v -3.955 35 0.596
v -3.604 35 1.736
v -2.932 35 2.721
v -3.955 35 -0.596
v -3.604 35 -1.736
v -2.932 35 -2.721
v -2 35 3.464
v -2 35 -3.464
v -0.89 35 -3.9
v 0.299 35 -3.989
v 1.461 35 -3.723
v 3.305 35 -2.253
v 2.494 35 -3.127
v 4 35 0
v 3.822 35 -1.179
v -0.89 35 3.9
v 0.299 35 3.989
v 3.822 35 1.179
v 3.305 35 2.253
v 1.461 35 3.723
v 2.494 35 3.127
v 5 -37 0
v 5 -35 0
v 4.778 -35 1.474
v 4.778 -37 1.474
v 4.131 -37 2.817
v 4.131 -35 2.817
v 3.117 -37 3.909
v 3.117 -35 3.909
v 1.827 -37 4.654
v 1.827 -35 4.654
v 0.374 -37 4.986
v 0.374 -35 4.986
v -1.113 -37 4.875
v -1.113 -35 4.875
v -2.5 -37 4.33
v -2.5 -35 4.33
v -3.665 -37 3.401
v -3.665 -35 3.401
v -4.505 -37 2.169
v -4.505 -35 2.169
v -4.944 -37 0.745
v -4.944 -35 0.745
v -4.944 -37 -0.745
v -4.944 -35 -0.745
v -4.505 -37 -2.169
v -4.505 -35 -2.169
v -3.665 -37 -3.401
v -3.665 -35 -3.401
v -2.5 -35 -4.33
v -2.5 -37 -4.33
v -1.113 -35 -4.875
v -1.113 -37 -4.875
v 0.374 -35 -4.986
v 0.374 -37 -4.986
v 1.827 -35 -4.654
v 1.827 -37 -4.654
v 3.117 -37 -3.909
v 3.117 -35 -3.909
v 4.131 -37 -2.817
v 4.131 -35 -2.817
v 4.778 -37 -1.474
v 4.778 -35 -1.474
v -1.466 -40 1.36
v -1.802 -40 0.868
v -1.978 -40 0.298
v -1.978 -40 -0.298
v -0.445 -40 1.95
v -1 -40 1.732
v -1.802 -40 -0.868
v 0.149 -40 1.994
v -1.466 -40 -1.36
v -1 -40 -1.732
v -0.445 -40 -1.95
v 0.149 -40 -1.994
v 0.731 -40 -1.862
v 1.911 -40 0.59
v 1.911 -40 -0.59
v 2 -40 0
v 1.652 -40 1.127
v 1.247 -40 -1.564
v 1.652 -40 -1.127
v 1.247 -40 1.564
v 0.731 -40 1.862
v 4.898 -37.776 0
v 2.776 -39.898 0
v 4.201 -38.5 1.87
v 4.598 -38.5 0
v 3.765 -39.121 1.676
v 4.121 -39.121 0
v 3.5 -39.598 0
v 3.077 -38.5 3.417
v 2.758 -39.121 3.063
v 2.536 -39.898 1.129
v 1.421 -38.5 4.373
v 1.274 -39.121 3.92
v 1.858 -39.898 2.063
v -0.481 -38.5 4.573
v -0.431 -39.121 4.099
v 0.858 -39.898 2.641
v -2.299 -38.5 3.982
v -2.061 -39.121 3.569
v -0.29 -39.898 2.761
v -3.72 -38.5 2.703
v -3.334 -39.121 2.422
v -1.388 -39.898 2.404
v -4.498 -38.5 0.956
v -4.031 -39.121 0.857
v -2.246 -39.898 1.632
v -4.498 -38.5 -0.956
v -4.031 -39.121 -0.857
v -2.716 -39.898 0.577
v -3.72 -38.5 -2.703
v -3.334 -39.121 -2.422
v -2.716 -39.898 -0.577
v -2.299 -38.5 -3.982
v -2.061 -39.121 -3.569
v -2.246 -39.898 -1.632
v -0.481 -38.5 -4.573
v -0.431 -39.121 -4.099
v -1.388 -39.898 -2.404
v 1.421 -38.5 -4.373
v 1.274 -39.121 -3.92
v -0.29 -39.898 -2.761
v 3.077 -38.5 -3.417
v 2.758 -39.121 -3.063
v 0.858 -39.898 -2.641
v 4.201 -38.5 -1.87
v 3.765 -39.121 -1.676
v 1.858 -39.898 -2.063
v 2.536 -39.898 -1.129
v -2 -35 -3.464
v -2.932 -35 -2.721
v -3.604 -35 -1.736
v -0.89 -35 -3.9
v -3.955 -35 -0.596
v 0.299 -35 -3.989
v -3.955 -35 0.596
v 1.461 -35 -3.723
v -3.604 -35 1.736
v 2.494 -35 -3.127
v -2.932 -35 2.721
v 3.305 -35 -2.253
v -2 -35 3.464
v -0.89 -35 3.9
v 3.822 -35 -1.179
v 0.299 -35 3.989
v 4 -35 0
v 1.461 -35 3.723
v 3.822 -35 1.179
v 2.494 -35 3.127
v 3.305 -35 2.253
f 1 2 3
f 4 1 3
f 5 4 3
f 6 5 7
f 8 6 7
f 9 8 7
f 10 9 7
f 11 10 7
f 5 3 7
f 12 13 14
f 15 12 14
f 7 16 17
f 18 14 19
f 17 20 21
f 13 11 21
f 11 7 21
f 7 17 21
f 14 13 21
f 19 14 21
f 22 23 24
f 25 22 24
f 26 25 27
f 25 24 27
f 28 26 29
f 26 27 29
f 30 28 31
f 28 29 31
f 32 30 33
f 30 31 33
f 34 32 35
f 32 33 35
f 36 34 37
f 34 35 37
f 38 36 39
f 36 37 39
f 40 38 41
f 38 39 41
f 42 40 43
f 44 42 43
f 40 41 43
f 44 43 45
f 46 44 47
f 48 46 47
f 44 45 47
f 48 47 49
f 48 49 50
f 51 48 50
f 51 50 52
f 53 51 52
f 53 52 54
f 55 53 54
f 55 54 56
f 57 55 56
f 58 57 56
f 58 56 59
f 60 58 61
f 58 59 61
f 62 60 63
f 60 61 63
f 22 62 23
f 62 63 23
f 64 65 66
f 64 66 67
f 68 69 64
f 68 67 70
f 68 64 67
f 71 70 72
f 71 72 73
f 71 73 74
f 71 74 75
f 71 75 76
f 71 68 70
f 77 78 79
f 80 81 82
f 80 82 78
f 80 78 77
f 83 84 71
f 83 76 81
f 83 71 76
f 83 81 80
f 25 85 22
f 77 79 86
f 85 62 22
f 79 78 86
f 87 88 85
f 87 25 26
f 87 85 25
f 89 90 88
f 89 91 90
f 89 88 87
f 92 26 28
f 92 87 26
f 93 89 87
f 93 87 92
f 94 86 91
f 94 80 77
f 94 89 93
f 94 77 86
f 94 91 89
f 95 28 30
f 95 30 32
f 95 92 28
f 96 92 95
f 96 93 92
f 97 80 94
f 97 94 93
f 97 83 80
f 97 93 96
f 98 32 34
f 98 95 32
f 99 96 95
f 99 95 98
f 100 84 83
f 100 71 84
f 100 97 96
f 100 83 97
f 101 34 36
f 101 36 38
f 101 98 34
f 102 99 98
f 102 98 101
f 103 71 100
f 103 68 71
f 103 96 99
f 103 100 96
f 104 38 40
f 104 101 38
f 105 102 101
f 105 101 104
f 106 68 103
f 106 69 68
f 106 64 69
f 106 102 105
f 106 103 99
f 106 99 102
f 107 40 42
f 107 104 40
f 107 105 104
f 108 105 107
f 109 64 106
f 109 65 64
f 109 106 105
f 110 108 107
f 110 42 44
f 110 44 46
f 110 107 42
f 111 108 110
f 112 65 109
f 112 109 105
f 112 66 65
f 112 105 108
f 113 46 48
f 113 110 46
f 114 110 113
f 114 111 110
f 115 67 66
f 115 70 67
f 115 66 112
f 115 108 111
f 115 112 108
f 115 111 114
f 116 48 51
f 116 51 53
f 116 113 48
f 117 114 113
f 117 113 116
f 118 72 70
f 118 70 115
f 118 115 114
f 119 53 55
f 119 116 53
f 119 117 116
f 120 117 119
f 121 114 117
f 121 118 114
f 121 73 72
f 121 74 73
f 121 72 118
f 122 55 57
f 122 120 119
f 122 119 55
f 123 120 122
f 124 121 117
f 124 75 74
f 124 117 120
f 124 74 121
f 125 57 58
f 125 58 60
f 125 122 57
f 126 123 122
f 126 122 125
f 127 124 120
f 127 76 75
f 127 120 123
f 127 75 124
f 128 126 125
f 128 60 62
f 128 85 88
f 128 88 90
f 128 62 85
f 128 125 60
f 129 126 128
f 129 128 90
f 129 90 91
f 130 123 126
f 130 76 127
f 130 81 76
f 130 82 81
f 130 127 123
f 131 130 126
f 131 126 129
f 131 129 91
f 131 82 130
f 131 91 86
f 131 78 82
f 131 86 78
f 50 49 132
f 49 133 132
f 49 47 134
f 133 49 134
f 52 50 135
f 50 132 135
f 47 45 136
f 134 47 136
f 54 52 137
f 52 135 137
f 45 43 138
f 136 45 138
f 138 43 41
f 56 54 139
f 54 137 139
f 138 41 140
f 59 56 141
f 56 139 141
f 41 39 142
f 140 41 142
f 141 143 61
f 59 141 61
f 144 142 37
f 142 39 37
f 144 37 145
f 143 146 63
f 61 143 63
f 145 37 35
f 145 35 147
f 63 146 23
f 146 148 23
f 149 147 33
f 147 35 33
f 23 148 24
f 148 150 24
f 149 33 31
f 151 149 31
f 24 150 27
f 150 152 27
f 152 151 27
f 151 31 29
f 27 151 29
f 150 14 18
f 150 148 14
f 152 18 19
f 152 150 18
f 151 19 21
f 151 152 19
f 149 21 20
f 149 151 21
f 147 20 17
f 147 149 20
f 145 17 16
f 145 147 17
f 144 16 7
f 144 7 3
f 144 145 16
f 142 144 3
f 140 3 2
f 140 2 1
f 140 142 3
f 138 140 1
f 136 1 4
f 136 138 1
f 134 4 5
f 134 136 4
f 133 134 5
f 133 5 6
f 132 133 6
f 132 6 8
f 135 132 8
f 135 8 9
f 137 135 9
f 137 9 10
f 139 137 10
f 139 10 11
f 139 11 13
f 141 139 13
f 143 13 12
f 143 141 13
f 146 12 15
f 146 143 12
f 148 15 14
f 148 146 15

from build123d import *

# Parameters (mm, degrees)
F0_R     = 4
F1_DEPTH = 35
F2_R     = 5
F2_R_2   = 4
F3_DEPTH = 5
F4_R     = 3


with BuildPart() as f1:
    # F0 (on Front) → F1 (new body, symmetric)
    with BuildSketch(Plane.XZ):
        Circle(F0_R)
    extrude(amount=F1_DEPTH, both=True)

    # F2 (on face) → F3 (join)
    with BuildSketch(Plane.XZ.offset(35)):
        Circle(F2_R)
        Circle(F2_R_2, mode=Mode.SUBTRACT)
        Circle(F2_R_2)
    extrude(amount=F3_DEPTH)

    # F4
    f4_edges = [f1.edges().sort_by_distance(p)[0] for p in [
        (-5, -40, 0),
    ]]
    fillet(f4_edges, radius=F4_R)


solid = f1.part
